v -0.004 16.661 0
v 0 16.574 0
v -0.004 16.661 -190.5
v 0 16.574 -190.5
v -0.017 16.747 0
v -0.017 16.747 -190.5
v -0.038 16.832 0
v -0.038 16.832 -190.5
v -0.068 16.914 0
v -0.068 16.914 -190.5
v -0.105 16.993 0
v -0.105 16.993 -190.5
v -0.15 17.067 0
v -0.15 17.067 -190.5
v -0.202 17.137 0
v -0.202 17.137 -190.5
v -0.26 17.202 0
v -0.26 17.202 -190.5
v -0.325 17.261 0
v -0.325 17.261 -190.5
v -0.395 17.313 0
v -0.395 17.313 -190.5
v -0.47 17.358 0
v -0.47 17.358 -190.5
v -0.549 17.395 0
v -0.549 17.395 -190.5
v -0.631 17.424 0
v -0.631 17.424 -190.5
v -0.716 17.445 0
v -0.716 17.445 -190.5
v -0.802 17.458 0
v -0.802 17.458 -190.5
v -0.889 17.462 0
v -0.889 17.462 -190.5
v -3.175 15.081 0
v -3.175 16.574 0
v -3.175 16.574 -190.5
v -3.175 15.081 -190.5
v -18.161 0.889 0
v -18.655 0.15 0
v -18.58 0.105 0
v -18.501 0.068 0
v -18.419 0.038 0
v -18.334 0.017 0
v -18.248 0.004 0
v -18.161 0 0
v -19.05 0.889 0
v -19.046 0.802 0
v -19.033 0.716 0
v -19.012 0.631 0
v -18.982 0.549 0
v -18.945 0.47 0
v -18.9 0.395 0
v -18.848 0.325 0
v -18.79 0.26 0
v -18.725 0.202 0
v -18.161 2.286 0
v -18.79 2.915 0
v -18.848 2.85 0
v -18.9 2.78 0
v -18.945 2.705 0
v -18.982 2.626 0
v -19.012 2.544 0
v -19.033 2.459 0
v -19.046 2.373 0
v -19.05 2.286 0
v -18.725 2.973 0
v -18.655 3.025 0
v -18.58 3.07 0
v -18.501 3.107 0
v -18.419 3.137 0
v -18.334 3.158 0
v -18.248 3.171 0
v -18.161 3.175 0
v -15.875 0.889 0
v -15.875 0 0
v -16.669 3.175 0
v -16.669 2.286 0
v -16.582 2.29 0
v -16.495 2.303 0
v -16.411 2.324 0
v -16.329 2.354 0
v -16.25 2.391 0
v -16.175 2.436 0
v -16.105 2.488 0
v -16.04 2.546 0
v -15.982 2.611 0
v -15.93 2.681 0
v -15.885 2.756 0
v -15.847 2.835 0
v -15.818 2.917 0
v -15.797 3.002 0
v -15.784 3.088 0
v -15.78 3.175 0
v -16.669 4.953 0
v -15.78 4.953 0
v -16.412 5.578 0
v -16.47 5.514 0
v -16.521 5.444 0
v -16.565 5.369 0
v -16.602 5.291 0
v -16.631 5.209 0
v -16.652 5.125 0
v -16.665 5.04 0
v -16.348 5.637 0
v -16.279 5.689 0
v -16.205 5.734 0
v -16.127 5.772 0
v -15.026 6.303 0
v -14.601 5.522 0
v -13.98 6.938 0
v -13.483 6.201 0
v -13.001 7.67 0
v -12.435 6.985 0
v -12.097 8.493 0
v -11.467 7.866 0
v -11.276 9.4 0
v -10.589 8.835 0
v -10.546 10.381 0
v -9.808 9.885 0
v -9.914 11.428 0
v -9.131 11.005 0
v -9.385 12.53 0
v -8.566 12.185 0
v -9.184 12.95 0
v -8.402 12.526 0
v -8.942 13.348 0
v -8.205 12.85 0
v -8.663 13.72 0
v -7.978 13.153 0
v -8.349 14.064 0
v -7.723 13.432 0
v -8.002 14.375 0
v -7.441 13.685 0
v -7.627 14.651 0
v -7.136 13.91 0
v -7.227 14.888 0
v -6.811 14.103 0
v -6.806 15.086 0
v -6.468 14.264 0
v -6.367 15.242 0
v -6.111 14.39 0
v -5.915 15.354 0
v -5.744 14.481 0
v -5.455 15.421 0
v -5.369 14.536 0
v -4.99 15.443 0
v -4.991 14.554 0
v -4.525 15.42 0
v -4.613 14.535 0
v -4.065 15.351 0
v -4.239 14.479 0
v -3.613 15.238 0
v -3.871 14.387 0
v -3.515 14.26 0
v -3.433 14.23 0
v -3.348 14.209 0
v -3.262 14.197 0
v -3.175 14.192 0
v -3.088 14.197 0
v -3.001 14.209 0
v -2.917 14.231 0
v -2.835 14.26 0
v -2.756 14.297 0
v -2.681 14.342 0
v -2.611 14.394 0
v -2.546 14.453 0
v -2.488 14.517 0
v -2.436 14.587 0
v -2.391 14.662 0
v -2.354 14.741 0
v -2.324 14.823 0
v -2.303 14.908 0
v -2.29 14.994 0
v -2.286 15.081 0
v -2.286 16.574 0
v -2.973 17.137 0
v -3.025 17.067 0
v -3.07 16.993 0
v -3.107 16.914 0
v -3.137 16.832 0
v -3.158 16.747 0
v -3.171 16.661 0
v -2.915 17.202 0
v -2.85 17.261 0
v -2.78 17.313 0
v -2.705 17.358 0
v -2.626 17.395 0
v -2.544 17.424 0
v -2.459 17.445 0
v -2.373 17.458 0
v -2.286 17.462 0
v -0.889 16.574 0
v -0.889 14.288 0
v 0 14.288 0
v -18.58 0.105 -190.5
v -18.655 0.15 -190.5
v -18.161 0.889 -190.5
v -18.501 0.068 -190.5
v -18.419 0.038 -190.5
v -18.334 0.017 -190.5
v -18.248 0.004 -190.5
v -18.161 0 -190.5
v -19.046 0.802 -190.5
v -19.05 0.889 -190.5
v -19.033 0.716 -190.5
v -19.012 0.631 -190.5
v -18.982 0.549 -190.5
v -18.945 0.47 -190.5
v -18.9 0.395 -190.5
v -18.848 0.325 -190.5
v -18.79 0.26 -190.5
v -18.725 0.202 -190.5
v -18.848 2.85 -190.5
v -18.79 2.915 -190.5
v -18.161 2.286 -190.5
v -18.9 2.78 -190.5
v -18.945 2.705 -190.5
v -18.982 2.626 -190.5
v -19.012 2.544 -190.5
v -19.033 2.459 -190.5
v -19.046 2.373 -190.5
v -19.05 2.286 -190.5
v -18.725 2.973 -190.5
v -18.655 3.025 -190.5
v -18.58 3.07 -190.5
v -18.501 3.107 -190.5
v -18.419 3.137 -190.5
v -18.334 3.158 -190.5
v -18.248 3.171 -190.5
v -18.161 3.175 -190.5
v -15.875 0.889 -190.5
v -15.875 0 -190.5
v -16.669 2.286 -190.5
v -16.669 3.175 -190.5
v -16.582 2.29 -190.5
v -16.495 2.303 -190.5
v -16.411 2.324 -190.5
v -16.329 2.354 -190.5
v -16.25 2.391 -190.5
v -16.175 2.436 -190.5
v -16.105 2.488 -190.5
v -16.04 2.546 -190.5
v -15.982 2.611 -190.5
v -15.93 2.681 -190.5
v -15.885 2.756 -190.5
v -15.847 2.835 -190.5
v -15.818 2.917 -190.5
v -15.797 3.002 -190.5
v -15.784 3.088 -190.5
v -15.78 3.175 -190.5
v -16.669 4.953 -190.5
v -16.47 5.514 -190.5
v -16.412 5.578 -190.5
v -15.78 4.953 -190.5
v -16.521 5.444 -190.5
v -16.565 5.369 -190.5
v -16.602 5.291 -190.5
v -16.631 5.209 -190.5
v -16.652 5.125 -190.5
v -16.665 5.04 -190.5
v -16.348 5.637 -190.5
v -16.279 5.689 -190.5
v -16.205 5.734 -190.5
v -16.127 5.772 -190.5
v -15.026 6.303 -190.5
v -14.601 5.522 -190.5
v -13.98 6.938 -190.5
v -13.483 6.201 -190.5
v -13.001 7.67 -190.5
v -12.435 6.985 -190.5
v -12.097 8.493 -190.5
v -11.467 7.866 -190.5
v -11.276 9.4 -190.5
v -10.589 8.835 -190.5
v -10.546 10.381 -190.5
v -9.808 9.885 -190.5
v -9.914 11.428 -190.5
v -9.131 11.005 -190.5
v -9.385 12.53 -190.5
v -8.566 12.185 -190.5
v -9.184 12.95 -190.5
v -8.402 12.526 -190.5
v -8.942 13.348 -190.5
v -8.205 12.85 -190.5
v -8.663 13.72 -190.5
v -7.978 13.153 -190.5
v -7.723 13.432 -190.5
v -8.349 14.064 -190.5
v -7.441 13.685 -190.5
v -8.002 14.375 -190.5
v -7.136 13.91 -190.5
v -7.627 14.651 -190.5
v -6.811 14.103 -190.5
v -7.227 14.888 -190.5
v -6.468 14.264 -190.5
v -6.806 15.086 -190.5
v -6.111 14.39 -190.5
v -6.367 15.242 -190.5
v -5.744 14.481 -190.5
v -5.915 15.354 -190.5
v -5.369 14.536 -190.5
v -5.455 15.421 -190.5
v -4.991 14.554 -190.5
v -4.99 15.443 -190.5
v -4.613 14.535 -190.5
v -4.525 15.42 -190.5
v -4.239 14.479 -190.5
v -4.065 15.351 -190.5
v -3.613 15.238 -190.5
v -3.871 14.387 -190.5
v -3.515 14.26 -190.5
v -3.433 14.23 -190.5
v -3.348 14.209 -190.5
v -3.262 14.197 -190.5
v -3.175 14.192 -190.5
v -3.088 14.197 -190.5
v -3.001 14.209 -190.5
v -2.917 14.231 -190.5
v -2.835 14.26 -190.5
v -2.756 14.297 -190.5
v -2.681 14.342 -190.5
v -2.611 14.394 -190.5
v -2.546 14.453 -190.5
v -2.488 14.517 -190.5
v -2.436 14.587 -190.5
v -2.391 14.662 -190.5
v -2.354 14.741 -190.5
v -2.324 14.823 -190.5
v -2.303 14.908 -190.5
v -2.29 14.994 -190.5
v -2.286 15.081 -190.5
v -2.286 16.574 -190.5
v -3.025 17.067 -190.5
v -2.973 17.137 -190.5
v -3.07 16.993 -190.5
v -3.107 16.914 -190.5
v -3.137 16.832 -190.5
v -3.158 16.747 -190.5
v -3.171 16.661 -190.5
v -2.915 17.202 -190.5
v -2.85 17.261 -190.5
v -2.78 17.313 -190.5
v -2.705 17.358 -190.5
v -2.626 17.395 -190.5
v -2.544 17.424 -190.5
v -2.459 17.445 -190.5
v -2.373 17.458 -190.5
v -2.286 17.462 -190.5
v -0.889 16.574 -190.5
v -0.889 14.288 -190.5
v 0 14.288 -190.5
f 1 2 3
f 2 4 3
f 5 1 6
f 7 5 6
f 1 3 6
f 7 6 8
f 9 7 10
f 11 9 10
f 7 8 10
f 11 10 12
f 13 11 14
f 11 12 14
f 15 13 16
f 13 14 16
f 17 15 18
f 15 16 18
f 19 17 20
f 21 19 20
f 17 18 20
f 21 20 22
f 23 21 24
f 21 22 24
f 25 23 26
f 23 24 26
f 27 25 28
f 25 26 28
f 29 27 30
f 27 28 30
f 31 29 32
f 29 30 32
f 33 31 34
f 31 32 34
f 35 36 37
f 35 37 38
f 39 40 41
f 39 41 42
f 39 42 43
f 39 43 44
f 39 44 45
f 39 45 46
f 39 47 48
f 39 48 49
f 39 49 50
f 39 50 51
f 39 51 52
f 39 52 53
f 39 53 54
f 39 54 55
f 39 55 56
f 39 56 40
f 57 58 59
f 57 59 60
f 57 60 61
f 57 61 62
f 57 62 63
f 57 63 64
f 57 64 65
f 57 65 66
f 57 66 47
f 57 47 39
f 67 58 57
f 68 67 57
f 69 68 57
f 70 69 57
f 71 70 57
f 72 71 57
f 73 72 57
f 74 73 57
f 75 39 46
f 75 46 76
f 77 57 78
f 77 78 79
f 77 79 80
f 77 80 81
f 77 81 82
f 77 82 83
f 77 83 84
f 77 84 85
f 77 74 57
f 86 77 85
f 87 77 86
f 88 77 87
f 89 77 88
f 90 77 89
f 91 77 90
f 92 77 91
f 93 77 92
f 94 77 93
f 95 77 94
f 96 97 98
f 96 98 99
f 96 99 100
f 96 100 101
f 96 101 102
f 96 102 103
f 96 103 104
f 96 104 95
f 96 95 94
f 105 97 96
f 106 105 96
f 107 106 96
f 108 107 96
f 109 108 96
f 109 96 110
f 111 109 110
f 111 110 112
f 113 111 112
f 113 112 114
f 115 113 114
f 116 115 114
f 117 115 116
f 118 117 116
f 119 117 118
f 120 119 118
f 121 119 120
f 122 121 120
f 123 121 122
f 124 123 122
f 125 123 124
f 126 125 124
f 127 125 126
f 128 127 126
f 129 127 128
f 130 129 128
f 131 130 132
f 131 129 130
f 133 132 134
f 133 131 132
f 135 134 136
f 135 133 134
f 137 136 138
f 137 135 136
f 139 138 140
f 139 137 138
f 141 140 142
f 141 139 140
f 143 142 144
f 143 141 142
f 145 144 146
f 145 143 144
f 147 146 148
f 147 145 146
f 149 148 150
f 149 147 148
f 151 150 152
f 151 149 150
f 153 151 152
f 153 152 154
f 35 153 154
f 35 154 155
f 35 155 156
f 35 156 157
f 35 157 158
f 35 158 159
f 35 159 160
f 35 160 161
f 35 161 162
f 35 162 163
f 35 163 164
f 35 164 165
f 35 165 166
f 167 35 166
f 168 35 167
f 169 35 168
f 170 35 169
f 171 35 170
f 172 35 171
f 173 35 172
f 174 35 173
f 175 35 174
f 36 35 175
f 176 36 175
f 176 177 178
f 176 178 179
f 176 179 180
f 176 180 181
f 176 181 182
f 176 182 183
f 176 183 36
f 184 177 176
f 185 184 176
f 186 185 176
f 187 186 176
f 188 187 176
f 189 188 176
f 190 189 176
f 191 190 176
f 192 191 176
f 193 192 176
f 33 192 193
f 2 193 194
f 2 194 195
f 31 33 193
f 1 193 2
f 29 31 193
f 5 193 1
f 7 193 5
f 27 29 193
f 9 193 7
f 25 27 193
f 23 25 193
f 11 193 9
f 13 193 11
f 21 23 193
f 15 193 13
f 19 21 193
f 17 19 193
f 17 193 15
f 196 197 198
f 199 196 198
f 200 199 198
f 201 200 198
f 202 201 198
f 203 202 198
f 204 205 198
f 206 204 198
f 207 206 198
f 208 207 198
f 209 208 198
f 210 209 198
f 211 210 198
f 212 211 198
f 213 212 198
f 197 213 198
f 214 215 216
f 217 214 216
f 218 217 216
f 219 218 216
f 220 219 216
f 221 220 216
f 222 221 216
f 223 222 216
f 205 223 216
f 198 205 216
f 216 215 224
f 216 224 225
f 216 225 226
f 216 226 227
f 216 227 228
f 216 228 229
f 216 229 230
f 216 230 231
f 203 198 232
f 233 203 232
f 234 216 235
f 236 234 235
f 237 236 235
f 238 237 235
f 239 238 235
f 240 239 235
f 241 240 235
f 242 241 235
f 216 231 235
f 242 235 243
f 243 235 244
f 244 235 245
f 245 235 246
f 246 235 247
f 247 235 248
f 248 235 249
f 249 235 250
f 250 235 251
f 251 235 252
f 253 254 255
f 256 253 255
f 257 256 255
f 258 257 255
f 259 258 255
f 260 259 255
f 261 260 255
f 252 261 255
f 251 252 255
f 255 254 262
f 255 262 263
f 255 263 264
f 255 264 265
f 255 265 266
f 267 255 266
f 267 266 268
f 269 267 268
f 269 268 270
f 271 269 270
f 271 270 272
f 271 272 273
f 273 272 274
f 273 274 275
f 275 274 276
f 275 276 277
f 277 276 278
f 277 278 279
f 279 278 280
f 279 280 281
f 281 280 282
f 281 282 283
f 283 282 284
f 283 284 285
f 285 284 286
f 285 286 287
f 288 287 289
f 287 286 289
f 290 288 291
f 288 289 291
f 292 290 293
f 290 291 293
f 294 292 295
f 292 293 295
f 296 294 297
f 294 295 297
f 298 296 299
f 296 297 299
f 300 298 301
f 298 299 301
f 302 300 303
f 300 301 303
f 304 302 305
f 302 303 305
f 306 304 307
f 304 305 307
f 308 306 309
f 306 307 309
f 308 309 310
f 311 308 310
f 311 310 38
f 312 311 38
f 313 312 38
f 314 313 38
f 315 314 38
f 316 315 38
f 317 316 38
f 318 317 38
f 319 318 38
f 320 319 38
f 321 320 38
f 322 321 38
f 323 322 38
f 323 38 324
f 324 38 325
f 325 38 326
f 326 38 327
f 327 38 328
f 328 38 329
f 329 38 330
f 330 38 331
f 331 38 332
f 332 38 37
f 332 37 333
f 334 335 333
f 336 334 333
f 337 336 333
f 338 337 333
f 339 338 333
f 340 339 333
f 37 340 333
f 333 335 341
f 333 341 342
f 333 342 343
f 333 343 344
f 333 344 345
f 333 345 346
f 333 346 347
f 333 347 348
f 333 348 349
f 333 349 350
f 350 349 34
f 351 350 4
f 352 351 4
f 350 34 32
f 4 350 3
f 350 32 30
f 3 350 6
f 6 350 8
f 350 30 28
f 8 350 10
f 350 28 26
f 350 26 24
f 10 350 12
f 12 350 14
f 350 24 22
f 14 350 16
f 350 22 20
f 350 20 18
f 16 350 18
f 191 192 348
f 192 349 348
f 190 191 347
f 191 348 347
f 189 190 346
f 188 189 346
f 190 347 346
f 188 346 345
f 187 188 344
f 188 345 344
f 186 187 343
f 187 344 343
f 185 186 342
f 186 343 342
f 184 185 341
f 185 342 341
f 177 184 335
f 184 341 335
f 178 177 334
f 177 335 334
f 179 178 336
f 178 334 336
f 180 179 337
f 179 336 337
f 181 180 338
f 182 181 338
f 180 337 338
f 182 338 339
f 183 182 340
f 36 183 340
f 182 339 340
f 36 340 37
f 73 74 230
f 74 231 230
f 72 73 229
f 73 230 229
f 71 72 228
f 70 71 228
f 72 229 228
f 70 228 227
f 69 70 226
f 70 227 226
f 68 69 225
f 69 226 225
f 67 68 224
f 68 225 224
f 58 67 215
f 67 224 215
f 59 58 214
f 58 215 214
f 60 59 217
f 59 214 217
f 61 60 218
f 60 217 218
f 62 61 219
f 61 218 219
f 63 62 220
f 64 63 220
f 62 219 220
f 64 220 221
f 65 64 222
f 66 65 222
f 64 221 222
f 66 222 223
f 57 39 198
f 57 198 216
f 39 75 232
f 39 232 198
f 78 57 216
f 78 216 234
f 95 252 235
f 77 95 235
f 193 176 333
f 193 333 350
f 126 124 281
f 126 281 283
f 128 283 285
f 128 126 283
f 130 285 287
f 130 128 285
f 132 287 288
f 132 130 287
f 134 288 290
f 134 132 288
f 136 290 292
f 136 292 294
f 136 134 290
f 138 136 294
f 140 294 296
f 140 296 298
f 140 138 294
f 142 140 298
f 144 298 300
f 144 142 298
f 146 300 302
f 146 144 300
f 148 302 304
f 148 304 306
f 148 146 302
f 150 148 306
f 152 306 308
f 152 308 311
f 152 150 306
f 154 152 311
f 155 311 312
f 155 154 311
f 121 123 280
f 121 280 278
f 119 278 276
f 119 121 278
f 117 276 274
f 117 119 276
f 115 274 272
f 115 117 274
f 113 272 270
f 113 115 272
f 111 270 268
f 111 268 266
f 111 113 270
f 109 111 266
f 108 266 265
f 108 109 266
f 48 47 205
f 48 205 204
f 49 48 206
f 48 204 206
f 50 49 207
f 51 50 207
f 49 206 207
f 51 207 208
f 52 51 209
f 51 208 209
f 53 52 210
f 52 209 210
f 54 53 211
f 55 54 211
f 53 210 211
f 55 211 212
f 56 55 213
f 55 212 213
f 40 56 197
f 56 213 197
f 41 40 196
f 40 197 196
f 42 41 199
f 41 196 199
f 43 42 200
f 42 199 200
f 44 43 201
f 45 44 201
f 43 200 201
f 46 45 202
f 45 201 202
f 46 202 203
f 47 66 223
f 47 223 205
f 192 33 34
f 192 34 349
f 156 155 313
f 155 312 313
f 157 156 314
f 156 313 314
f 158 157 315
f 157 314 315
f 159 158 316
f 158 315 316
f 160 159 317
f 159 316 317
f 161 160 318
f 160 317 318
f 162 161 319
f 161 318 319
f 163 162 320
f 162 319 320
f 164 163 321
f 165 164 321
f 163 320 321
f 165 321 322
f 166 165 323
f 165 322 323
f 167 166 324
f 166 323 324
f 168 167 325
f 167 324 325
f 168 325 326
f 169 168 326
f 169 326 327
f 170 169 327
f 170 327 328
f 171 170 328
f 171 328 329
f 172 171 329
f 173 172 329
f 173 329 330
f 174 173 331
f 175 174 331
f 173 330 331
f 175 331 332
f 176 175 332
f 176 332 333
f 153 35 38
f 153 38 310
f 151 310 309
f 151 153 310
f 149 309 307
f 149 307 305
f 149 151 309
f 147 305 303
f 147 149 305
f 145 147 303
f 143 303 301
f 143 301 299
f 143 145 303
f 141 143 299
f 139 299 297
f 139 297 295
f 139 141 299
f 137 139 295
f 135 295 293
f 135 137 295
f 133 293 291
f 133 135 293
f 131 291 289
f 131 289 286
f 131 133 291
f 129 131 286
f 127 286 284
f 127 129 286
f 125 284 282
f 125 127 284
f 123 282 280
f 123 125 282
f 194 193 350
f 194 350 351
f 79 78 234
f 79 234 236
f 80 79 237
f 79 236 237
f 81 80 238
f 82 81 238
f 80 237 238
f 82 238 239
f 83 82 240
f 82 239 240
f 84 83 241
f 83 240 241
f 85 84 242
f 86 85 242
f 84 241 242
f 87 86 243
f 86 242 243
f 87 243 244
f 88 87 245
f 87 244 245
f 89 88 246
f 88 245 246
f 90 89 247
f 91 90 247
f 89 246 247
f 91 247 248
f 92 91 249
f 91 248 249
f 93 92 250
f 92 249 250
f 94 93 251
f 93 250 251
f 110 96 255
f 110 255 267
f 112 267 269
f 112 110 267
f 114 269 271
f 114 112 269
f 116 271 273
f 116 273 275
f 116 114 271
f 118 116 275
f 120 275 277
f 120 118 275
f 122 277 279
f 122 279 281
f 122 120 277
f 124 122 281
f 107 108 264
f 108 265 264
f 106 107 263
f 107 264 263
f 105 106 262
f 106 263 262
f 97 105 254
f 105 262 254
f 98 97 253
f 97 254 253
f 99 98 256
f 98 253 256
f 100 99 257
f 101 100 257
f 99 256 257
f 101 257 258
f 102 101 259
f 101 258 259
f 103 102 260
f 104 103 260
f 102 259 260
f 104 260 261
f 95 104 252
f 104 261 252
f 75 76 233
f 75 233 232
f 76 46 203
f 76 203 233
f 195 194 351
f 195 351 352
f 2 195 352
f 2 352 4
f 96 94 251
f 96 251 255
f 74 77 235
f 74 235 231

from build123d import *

# Parameters (mm, degrees)
EXTRUDE_THIN1_DEPTH = 190.5
FILLET1_R           = 0.889


with BuildPart() as part:
    # Sketch1 → Extrude-Thin1 (new body)
    with BuildSketch(Plane.XY):
        with BuildLine():
            Line((0, 14.2875), (0, 17.4625))
            Line((0, 17.4625), (-3.175, 17.4625))
            Line((-3.175, 17.4625), (-3.175, 15.08125))
            ThreePointArc((-3.175, 15.08125), (-6.80591832, 15.086090387), (-9.38501075, 12.530337363))
            ThreePointArc((-9.38501075, 12.530337363), (-12.305011444, 8.289373521), (-16.66875, 5.55625))
            Line((-16.66875, 5.55625), (-16.66875, 3.175))
            Line((-16.66875, 3.175), (-19.05, 3.175))
            Line((-19.05, 3.175), (-19.05, 0))
            Line((-19.05, 0), (-15.875, 0))
            Line((-15.875, 0), (-15.875, 0.889))
            Line((-15.875, 0.889), (-18.161, 0.889))
            Line((-18.161, 0.889), (-18.161, 2.286))
            Line((-18.161, 2.286), (-15.77975, 2.286))
            Line((-15.77975, 2.286), (-15.77975, 4.95323652))
            ThreePointArc((-15.77975, 4.95323652), (-11.467396752, 7.865532848), (-8.565790095, 12.185085979))
            ThreePointArc((-8.565790095, 12.185085979), (-5.760091082, 14.478232), (-2.286, 13.448107355))
            Line((-2.286, 13.448107355), (-2.286, 16.5735))
            Line((-2.286, 16.5735), (-0.889, 16.5735))
            Line((-0.889, 16.5735), (-0.889, 14.2875))
            Line((-0.889, 14.2875), (0, 14.2875))
        make_face()
    extrude(amount=-EXTRUDE_THIN1_DEPTH)

    # Fillet1
    fillet1_edges = [part.edges().sort_by_distance(p)[0] for p in [
        (-19.05, 0, -95.25),
        (-19.05, 3.175, -95.25),
        (-16.66875, 5.55625, -95.25),
        (-3.175, 17.4625, -95.25),
        (0, 17.4625, -95.25),
        (-2.286, 13.448107355, -95.25),
        (-15.77975, 2.286, -95.25),
    ]]
    fillet(fillet1_edges, radius=FILLET1_R)


solid = part.part
